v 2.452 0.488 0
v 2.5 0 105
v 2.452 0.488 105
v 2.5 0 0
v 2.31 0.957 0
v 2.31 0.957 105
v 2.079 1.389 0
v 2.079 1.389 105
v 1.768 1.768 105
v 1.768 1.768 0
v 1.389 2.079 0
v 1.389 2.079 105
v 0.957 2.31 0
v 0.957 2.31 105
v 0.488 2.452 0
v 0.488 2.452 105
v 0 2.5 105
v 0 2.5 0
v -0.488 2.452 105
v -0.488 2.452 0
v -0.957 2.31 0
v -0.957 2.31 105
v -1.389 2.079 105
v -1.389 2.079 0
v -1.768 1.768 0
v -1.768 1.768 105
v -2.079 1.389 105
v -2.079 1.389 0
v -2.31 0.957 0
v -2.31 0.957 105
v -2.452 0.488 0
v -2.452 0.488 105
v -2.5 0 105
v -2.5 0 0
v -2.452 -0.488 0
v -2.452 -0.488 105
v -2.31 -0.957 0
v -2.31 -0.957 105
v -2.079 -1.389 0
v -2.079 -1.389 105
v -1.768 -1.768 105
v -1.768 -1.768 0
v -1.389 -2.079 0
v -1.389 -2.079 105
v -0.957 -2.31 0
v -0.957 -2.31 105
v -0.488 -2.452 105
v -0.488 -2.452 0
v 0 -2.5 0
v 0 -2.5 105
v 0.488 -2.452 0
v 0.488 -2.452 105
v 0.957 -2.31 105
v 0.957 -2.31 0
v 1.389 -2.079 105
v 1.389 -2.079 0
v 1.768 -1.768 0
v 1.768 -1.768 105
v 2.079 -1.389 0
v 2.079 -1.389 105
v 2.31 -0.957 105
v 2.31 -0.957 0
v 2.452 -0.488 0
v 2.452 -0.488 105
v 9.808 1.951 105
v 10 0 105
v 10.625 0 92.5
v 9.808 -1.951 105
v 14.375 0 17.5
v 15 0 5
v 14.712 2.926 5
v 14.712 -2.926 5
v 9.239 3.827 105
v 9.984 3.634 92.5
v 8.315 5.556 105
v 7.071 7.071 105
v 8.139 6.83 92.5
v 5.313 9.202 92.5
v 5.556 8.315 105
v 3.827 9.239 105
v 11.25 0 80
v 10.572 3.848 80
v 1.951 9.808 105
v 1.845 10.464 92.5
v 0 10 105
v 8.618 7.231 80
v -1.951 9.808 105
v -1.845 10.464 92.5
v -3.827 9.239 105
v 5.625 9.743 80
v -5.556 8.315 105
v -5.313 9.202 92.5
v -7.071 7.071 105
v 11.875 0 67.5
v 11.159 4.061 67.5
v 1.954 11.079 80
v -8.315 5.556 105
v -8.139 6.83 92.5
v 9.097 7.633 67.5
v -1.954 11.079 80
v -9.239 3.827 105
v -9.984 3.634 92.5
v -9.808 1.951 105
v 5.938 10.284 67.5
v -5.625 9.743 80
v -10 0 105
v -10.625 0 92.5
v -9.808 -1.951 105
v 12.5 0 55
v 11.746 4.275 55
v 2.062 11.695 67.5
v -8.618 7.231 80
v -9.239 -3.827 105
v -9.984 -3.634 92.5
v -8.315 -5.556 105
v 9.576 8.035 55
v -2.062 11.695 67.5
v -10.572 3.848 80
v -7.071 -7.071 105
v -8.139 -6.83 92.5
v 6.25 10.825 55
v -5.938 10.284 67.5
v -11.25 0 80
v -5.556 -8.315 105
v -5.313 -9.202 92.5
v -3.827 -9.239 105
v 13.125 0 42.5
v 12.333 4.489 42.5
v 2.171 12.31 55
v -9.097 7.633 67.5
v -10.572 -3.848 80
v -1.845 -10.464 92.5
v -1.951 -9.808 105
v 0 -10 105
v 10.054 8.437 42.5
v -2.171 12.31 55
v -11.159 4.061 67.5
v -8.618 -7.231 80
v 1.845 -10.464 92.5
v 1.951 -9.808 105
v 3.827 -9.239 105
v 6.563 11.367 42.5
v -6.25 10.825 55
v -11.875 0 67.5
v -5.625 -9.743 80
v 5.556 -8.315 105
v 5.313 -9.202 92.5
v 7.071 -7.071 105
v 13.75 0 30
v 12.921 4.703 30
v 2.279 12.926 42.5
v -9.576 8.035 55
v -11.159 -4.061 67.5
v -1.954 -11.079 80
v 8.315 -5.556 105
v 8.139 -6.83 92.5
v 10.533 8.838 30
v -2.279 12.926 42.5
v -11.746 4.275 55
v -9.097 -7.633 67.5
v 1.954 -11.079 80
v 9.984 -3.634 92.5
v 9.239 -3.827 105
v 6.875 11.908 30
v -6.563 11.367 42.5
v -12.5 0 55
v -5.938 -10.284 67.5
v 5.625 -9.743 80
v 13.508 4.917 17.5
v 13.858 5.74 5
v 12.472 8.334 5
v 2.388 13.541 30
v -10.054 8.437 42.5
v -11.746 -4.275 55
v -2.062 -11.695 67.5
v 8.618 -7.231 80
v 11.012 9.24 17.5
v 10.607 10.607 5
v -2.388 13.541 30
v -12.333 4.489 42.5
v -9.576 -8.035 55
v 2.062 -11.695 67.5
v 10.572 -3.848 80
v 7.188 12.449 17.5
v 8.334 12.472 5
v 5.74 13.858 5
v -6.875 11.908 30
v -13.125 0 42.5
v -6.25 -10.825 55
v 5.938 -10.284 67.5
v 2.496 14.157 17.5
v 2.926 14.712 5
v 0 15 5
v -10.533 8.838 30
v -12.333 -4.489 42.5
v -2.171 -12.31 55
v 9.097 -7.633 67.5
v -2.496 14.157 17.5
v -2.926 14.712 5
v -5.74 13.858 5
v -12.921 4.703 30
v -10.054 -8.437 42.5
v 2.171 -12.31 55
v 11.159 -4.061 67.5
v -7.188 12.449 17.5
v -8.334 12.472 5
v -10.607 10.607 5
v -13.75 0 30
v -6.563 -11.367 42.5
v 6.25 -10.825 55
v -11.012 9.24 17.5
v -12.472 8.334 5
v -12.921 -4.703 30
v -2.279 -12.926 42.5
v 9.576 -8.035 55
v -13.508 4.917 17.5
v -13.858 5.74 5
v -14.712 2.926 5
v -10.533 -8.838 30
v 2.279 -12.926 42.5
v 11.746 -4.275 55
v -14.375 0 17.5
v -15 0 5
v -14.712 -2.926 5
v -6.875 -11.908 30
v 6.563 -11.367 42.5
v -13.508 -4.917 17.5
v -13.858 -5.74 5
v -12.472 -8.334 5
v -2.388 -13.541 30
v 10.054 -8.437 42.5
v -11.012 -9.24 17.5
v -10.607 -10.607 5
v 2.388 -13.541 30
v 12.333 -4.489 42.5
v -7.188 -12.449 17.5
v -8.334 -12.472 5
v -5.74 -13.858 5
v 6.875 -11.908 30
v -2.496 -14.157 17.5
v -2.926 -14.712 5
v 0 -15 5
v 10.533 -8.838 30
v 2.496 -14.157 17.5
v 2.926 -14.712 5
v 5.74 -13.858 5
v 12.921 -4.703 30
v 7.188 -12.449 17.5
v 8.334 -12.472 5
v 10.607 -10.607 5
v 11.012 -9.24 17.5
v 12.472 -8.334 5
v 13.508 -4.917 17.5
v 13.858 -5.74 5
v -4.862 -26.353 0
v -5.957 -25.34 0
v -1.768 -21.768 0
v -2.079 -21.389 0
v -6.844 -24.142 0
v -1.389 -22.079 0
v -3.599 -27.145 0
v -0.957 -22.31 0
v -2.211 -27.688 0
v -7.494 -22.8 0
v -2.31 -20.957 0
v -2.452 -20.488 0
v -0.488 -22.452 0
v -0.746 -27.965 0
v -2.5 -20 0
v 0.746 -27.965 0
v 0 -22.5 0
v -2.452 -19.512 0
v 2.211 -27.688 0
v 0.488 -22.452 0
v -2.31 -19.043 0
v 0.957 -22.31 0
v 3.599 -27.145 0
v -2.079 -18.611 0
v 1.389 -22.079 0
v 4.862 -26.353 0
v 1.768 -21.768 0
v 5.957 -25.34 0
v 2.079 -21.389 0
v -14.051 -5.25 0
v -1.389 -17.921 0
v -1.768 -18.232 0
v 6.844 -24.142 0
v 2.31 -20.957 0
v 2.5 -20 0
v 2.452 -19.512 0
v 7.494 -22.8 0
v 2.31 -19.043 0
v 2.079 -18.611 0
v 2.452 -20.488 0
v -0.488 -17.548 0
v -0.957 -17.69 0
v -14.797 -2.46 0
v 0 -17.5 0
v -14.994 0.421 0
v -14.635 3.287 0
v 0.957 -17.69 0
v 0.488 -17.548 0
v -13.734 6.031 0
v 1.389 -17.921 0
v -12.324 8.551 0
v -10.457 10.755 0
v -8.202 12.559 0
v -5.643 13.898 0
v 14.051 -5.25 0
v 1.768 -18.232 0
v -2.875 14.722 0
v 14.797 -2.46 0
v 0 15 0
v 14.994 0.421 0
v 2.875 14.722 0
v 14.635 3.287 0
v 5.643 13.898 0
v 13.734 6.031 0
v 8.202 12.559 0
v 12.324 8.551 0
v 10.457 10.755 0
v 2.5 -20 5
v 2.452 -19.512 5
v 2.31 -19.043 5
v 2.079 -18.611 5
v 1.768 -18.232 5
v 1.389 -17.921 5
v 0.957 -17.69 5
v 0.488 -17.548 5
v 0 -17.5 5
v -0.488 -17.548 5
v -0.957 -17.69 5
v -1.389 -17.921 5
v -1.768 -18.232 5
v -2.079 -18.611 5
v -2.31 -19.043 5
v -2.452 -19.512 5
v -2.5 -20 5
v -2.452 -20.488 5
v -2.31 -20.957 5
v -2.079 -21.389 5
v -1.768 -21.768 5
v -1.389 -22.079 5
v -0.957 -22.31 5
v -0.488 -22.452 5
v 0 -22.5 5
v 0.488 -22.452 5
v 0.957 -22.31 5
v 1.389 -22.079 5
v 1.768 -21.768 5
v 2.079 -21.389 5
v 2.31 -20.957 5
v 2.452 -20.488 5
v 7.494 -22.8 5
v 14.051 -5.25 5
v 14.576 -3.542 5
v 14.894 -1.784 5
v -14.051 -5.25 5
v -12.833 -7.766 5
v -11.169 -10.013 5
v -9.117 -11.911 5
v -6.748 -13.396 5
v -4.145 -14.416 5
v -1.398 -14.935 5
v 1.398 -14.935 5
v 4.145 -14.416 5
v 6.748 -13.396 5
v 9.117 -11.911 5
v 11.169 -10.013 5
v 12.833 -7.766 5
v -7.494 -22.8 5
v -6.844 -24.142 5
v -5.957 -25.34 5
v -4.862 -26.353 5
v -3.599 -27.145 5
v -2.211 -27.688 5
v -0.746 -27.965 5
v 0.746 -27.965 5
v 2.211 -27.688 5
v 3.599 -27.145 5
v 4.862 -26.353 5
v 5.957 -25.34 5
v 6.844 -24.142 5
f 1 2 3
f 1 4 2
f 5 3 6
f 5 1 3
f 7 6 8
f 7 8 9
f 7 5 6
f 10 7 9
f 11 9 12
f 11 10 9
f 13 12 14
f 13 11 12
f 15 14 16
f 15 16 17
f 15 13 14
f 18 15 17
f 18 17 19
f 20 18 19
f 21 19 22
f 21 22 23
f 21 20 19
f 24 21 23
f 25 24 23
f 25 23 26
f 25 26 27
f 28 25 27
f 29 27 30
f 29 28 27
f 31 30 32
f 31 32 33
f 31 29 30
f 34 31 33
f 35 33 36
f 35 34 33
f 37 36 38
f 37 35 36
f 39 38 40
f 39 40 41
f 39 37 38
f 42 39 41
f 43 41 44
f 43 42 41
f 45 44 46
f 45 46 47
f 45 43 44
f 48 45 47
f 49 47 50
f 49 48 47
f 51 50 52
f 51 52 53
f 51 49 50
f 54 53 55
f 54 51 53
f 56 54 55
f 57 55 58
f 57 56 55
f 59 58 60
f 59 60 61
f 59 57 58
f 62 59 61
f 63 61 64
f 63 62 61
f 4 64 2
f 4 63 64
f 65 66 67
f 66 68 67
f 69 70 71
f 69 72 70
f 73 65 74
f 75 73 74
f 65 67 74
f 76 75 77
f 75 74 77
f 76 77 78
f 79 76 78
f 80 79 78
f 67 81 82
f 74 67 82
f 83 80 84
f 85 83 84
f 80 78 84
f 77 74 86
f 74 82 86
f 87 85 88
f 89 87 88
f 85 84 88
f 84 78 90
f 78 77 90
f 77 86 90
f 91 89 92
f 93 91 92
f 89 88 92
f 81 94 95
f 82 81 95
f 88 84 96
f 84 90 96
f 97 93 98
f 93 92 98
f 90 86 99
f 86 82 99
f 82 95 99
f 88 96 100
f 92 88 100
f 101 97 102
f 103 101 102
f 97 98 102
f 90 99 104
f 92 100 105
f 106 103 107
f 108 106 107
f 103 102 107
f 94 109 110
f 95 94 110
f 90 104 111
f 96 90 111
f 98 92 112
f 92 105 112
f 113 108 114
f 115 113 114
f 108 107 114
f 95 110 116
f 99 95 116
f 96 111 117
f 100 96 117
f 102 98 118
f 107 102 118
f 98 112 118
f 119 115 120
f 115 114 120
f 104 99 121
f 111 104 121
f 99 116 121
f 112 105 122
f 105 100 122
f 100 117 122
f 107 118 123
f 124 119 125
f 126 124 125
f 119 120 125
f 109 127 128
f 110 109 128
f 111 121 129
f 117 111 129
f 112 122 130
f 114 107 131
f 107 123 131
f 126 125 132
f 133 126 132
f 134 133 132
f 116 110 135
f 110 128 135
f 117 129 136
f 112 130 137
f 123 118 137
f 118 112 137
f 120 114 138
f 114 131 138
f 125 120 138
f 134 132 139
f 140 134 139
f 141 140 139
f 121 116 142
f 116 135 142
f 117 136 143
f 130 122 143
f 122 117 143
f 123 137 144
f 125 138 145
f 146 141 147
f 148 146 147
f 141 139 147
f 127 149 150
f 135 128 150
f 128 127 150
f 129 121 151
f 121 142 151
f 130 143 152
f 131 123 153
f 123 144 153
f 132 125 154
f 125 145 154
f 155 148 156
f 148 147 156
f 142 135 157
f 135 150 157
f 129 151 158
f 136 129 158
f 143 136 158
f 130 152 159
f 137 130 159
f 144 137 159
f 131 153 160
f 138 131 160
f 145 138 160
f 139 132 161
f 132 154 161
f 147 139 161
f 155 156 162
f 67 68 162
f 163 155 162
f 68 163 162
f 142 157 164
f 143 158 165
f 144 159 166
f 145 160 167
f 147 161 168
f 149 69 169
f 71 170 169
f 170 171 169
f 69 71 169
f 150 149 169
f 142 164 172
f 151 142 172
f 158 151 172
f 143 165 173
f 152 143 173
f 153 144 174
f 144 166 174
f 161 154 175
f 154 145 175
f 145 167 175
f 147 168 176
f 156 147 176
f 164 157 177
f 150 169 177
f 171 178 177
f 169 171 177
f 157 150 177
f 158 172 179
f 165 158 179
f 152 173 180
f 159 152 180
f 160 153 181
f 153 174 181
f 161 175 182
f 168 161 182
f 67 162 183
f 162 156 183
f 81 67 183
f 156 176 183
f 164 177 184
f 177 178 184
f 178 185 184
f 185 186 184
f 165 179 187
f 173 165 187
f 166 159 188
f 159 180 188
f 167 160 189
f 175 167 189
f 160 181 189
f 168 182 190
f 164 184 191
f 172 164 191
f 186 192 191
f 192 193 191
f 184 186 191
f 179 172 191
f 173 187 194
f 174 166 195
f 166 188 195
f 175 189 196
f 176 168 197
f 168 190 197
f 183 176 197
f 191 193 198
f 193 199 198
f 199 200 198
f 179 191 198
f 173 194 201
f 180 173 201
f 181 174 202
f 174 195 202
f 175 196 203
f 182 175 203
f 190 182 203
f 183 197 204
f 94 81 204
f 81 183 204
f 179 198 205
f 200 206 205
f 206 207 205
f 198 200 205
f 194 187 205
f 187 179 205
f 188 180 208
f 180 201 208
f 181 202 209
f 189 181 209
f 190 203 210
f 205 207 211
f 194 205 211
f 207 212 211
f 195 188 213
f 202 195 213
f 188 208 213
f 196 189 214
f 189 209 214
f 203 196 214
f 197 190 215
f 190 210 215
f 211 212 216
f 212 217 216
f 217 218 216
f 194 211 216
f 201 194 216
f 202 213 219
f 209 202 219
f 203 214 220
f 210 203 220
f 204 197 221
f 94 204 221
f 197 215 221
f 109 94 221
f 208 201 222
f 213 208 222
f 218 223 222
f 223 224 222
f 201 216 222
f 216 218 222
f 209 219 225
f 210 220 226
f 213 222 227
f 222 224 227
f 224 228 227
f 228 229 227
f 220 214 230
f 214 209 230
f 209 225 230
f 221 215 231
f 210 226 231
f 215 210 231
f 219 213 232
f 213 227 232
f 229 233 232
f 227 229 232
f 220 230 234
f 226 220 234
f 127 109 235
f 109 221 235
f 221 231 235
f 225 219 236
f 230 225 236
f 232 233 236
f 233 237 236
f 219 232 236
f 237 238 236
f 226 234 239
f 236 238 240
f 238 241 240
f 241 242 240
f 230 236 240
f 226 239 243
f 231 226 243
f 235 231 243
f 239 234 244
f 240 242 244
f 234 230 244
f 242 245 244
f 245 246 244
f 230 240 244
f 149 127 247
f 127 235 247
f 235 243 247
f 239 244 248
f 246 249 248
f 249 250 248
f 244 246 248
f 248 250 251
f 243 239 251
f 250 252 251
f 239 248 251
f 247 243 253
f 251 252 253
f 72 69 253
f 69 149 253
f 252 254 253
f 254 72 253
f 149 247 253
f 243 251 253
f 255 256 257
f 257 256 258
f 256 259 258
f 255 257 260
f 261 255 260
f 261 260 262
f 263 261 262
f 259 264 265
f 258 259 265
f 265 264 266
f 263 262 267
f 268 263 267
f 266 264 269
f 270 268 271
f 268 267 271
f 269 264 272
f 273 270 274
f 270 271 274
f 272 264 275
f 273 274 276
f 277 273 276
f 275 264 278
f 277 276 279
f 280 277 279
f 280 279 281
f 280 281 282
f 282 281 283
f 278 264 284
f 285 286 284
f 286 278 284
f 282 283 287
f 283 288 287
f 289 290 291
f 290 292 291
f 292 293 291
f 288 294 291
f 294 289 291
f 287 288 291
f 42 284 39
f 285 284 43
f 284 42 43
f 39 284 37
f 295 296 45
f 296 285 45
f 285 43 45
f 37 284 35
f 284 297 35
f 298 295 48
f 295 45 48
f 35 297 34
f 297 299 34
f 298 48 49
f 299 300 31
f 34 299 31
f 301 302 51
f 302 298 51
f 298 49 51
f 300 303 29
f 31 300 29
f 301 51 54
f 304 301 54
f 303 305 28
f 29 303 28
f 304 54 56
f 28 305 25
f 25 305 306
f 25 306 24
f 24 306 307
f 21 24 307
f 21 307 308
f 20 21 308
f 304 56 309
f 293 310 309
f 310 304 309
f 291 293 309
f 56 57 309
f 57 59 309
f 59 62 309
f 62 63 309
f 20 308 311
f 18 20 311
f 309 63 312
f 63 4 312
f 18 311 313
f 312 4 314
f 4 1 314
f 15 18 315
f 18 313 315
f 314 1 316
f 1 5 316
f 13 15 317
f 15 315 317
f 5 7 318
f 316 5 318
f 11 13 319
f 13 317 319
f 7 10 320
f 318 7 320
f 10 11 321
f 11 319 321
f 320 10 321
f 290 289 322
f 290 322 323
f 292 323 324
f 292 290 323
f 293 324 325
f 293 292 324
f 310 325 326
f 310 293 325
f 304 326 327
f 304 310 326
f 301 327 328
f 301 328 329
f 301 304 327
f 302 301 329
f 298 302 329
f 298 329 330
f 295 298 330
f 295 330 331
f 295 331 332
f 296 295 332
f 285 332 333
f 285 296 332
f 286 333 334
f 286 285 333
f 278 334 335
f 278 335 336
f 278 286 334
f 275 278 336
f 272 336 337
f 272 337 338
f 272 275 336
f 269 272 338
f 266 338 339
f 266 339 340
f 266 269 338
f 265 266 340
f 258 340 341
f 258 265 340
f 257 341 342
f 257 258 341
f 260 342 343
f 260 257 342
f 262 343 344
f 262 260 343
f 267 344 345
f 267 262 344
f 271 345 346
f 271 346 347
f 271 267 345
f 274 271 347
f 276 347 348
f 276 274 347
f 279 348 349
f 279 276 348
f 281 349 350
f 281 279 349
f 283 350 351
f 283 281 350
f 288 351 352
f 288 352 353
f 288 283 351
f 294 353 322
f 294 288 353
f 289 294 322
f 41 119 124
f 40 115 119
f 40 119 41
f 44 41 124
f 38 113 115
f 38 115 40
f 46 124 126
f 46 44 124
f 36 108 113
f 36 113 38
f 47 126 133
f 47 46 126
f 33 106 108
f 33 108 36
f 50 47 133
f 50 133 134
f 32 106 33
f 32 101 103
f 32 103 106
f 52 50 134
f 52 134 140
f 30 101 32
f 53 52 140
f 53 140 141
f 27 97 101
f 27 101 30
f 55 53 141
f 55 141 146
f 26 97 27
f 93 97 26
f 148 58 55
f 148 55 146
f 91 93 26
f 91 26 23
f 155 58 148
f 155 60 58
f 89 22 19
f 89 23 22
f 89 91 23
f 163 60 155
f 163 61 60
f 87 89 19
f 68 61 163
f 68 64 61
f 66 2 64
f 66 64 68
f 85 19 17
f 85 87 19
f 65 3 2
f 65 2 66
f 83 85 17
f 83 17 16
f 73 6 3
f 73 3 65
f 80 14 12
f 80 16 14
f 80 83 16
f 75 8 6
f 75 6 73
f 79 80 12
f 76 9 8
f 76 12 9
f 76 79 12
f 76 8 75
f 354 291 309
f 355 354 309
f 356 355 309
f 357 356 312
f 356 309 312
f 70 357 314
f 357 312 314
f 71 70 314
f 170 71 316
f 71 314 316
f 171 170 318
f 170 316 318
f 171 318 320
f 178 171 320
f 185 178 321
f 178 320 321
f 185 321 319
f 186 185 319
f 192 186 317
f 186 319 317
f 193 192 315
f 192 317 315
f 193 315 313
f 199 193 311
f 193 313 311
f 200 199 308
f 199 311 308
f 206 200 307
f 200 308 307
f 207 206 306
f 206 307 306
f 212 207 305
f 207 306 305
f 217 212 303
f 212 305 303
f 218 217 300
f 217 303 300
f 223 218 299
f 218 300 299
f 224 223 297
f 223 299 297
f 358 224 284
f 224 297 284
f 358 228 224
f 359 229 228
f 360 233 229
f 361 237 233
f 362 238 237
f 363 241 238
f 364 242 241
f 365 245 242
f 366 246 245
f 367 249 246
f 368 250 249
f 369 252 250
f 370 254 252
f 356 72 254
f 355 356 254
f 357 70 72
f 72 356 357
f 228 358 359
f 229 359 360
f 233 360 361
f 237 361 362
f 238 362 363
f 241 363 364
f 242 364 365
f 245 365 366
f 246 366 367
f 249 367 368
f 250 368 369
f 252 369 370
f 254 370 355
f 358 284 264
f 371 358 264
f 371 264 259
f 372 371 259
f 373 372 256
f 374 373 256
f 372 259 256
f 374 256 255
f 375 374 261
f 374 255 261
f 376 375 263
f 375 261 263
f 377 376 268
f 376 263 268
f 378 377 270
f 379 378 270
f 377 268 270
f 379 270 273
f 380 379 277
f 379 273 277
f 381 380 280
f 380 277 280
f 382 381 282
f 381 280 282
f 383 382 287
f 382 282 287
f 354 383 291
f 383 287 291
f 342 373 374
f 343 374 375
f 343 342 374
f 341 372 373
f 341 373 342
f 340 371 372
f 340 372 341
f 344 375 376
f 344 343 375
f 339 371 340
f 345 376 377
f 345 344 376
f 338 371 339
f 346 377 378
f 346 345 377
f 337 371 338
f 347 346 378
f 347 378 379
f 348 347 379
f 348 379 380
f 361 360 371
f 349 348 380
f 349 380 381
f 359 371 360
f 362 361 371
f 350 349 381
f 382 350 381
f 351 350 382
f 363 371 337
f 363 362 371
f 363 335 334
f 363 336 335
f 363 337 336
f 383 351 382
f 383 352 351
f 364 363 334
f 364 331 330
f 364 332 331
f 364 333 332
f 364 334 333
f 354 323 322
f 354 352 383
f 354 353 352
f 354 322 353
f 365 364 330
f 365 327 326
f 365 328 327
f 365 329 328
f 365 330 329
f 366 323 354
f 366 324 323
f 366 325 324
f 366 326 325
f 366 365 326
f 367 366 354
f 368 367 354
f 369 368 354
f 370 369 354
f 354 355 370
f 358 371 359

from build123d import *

# Parameters (mm, degrees)
F0_R     = 2.5
F1_DEPTH = 5
F2_R     = 15
F2_R_2   = 2.5
F3_DEPTH = 100
F4_SIZE2 = 99.99999
F4_SIZE  = 4.99999


# Not quite as in the source:
# - a fillet or chamfer is up to 0.001 mm smaller than in the source, because OpenCascade refuses the exact size


with BuildPart() as f1:
    # F0 (on Top) → F1 (new body)
    with BuildSketch(Plane.XY):
        with BuildLine():
            Line((7.4939975981, -22.8), (14.0512454964, -5.25))
            ThreePointArc((14.0512454964, -5.25), (0, 15), (-14.0512454964, -5.25))
            Line((-14.0512454964, -5.25), (-7.4939975981, -22.8))
            ThreePointArc((-7.4939975981, -22.8), (0, -28), (7.4939975981, -22.8))
        make_face()
        with Locations((0, -20)):
            Circle(F0_R, mode=Mode.SUBTRACT)
        Circle(F0_R, mode=Mode.SUBTRACT)
    extrude(amount=F1_DEPTH)

    # F2 (on face) → F3 (join)
    with BuildSketch(Plane.XY.offset(5)):
        Circle(F2_R)
        Circle(F2_R_2, mode=Mode.SUBTRACT)
    extrude(amount=F3_DEPTH)

    # F4 (size 5 and 100 in the source; OpenCascade refuses exactly that, so slightly less here)
    f4_edges = [f1.edges().sort_by_distance(p)[0] for p in [
        (-15, 0, 105),
    ]]
    f4_side = f1.faces().sort_by_distance((-14.575736, 0, 105))[0]
    chamfer(f4_edges, length=F4_SIZE, length2=F4_SIZE2, reference=f4_side)


solid = f1.part
